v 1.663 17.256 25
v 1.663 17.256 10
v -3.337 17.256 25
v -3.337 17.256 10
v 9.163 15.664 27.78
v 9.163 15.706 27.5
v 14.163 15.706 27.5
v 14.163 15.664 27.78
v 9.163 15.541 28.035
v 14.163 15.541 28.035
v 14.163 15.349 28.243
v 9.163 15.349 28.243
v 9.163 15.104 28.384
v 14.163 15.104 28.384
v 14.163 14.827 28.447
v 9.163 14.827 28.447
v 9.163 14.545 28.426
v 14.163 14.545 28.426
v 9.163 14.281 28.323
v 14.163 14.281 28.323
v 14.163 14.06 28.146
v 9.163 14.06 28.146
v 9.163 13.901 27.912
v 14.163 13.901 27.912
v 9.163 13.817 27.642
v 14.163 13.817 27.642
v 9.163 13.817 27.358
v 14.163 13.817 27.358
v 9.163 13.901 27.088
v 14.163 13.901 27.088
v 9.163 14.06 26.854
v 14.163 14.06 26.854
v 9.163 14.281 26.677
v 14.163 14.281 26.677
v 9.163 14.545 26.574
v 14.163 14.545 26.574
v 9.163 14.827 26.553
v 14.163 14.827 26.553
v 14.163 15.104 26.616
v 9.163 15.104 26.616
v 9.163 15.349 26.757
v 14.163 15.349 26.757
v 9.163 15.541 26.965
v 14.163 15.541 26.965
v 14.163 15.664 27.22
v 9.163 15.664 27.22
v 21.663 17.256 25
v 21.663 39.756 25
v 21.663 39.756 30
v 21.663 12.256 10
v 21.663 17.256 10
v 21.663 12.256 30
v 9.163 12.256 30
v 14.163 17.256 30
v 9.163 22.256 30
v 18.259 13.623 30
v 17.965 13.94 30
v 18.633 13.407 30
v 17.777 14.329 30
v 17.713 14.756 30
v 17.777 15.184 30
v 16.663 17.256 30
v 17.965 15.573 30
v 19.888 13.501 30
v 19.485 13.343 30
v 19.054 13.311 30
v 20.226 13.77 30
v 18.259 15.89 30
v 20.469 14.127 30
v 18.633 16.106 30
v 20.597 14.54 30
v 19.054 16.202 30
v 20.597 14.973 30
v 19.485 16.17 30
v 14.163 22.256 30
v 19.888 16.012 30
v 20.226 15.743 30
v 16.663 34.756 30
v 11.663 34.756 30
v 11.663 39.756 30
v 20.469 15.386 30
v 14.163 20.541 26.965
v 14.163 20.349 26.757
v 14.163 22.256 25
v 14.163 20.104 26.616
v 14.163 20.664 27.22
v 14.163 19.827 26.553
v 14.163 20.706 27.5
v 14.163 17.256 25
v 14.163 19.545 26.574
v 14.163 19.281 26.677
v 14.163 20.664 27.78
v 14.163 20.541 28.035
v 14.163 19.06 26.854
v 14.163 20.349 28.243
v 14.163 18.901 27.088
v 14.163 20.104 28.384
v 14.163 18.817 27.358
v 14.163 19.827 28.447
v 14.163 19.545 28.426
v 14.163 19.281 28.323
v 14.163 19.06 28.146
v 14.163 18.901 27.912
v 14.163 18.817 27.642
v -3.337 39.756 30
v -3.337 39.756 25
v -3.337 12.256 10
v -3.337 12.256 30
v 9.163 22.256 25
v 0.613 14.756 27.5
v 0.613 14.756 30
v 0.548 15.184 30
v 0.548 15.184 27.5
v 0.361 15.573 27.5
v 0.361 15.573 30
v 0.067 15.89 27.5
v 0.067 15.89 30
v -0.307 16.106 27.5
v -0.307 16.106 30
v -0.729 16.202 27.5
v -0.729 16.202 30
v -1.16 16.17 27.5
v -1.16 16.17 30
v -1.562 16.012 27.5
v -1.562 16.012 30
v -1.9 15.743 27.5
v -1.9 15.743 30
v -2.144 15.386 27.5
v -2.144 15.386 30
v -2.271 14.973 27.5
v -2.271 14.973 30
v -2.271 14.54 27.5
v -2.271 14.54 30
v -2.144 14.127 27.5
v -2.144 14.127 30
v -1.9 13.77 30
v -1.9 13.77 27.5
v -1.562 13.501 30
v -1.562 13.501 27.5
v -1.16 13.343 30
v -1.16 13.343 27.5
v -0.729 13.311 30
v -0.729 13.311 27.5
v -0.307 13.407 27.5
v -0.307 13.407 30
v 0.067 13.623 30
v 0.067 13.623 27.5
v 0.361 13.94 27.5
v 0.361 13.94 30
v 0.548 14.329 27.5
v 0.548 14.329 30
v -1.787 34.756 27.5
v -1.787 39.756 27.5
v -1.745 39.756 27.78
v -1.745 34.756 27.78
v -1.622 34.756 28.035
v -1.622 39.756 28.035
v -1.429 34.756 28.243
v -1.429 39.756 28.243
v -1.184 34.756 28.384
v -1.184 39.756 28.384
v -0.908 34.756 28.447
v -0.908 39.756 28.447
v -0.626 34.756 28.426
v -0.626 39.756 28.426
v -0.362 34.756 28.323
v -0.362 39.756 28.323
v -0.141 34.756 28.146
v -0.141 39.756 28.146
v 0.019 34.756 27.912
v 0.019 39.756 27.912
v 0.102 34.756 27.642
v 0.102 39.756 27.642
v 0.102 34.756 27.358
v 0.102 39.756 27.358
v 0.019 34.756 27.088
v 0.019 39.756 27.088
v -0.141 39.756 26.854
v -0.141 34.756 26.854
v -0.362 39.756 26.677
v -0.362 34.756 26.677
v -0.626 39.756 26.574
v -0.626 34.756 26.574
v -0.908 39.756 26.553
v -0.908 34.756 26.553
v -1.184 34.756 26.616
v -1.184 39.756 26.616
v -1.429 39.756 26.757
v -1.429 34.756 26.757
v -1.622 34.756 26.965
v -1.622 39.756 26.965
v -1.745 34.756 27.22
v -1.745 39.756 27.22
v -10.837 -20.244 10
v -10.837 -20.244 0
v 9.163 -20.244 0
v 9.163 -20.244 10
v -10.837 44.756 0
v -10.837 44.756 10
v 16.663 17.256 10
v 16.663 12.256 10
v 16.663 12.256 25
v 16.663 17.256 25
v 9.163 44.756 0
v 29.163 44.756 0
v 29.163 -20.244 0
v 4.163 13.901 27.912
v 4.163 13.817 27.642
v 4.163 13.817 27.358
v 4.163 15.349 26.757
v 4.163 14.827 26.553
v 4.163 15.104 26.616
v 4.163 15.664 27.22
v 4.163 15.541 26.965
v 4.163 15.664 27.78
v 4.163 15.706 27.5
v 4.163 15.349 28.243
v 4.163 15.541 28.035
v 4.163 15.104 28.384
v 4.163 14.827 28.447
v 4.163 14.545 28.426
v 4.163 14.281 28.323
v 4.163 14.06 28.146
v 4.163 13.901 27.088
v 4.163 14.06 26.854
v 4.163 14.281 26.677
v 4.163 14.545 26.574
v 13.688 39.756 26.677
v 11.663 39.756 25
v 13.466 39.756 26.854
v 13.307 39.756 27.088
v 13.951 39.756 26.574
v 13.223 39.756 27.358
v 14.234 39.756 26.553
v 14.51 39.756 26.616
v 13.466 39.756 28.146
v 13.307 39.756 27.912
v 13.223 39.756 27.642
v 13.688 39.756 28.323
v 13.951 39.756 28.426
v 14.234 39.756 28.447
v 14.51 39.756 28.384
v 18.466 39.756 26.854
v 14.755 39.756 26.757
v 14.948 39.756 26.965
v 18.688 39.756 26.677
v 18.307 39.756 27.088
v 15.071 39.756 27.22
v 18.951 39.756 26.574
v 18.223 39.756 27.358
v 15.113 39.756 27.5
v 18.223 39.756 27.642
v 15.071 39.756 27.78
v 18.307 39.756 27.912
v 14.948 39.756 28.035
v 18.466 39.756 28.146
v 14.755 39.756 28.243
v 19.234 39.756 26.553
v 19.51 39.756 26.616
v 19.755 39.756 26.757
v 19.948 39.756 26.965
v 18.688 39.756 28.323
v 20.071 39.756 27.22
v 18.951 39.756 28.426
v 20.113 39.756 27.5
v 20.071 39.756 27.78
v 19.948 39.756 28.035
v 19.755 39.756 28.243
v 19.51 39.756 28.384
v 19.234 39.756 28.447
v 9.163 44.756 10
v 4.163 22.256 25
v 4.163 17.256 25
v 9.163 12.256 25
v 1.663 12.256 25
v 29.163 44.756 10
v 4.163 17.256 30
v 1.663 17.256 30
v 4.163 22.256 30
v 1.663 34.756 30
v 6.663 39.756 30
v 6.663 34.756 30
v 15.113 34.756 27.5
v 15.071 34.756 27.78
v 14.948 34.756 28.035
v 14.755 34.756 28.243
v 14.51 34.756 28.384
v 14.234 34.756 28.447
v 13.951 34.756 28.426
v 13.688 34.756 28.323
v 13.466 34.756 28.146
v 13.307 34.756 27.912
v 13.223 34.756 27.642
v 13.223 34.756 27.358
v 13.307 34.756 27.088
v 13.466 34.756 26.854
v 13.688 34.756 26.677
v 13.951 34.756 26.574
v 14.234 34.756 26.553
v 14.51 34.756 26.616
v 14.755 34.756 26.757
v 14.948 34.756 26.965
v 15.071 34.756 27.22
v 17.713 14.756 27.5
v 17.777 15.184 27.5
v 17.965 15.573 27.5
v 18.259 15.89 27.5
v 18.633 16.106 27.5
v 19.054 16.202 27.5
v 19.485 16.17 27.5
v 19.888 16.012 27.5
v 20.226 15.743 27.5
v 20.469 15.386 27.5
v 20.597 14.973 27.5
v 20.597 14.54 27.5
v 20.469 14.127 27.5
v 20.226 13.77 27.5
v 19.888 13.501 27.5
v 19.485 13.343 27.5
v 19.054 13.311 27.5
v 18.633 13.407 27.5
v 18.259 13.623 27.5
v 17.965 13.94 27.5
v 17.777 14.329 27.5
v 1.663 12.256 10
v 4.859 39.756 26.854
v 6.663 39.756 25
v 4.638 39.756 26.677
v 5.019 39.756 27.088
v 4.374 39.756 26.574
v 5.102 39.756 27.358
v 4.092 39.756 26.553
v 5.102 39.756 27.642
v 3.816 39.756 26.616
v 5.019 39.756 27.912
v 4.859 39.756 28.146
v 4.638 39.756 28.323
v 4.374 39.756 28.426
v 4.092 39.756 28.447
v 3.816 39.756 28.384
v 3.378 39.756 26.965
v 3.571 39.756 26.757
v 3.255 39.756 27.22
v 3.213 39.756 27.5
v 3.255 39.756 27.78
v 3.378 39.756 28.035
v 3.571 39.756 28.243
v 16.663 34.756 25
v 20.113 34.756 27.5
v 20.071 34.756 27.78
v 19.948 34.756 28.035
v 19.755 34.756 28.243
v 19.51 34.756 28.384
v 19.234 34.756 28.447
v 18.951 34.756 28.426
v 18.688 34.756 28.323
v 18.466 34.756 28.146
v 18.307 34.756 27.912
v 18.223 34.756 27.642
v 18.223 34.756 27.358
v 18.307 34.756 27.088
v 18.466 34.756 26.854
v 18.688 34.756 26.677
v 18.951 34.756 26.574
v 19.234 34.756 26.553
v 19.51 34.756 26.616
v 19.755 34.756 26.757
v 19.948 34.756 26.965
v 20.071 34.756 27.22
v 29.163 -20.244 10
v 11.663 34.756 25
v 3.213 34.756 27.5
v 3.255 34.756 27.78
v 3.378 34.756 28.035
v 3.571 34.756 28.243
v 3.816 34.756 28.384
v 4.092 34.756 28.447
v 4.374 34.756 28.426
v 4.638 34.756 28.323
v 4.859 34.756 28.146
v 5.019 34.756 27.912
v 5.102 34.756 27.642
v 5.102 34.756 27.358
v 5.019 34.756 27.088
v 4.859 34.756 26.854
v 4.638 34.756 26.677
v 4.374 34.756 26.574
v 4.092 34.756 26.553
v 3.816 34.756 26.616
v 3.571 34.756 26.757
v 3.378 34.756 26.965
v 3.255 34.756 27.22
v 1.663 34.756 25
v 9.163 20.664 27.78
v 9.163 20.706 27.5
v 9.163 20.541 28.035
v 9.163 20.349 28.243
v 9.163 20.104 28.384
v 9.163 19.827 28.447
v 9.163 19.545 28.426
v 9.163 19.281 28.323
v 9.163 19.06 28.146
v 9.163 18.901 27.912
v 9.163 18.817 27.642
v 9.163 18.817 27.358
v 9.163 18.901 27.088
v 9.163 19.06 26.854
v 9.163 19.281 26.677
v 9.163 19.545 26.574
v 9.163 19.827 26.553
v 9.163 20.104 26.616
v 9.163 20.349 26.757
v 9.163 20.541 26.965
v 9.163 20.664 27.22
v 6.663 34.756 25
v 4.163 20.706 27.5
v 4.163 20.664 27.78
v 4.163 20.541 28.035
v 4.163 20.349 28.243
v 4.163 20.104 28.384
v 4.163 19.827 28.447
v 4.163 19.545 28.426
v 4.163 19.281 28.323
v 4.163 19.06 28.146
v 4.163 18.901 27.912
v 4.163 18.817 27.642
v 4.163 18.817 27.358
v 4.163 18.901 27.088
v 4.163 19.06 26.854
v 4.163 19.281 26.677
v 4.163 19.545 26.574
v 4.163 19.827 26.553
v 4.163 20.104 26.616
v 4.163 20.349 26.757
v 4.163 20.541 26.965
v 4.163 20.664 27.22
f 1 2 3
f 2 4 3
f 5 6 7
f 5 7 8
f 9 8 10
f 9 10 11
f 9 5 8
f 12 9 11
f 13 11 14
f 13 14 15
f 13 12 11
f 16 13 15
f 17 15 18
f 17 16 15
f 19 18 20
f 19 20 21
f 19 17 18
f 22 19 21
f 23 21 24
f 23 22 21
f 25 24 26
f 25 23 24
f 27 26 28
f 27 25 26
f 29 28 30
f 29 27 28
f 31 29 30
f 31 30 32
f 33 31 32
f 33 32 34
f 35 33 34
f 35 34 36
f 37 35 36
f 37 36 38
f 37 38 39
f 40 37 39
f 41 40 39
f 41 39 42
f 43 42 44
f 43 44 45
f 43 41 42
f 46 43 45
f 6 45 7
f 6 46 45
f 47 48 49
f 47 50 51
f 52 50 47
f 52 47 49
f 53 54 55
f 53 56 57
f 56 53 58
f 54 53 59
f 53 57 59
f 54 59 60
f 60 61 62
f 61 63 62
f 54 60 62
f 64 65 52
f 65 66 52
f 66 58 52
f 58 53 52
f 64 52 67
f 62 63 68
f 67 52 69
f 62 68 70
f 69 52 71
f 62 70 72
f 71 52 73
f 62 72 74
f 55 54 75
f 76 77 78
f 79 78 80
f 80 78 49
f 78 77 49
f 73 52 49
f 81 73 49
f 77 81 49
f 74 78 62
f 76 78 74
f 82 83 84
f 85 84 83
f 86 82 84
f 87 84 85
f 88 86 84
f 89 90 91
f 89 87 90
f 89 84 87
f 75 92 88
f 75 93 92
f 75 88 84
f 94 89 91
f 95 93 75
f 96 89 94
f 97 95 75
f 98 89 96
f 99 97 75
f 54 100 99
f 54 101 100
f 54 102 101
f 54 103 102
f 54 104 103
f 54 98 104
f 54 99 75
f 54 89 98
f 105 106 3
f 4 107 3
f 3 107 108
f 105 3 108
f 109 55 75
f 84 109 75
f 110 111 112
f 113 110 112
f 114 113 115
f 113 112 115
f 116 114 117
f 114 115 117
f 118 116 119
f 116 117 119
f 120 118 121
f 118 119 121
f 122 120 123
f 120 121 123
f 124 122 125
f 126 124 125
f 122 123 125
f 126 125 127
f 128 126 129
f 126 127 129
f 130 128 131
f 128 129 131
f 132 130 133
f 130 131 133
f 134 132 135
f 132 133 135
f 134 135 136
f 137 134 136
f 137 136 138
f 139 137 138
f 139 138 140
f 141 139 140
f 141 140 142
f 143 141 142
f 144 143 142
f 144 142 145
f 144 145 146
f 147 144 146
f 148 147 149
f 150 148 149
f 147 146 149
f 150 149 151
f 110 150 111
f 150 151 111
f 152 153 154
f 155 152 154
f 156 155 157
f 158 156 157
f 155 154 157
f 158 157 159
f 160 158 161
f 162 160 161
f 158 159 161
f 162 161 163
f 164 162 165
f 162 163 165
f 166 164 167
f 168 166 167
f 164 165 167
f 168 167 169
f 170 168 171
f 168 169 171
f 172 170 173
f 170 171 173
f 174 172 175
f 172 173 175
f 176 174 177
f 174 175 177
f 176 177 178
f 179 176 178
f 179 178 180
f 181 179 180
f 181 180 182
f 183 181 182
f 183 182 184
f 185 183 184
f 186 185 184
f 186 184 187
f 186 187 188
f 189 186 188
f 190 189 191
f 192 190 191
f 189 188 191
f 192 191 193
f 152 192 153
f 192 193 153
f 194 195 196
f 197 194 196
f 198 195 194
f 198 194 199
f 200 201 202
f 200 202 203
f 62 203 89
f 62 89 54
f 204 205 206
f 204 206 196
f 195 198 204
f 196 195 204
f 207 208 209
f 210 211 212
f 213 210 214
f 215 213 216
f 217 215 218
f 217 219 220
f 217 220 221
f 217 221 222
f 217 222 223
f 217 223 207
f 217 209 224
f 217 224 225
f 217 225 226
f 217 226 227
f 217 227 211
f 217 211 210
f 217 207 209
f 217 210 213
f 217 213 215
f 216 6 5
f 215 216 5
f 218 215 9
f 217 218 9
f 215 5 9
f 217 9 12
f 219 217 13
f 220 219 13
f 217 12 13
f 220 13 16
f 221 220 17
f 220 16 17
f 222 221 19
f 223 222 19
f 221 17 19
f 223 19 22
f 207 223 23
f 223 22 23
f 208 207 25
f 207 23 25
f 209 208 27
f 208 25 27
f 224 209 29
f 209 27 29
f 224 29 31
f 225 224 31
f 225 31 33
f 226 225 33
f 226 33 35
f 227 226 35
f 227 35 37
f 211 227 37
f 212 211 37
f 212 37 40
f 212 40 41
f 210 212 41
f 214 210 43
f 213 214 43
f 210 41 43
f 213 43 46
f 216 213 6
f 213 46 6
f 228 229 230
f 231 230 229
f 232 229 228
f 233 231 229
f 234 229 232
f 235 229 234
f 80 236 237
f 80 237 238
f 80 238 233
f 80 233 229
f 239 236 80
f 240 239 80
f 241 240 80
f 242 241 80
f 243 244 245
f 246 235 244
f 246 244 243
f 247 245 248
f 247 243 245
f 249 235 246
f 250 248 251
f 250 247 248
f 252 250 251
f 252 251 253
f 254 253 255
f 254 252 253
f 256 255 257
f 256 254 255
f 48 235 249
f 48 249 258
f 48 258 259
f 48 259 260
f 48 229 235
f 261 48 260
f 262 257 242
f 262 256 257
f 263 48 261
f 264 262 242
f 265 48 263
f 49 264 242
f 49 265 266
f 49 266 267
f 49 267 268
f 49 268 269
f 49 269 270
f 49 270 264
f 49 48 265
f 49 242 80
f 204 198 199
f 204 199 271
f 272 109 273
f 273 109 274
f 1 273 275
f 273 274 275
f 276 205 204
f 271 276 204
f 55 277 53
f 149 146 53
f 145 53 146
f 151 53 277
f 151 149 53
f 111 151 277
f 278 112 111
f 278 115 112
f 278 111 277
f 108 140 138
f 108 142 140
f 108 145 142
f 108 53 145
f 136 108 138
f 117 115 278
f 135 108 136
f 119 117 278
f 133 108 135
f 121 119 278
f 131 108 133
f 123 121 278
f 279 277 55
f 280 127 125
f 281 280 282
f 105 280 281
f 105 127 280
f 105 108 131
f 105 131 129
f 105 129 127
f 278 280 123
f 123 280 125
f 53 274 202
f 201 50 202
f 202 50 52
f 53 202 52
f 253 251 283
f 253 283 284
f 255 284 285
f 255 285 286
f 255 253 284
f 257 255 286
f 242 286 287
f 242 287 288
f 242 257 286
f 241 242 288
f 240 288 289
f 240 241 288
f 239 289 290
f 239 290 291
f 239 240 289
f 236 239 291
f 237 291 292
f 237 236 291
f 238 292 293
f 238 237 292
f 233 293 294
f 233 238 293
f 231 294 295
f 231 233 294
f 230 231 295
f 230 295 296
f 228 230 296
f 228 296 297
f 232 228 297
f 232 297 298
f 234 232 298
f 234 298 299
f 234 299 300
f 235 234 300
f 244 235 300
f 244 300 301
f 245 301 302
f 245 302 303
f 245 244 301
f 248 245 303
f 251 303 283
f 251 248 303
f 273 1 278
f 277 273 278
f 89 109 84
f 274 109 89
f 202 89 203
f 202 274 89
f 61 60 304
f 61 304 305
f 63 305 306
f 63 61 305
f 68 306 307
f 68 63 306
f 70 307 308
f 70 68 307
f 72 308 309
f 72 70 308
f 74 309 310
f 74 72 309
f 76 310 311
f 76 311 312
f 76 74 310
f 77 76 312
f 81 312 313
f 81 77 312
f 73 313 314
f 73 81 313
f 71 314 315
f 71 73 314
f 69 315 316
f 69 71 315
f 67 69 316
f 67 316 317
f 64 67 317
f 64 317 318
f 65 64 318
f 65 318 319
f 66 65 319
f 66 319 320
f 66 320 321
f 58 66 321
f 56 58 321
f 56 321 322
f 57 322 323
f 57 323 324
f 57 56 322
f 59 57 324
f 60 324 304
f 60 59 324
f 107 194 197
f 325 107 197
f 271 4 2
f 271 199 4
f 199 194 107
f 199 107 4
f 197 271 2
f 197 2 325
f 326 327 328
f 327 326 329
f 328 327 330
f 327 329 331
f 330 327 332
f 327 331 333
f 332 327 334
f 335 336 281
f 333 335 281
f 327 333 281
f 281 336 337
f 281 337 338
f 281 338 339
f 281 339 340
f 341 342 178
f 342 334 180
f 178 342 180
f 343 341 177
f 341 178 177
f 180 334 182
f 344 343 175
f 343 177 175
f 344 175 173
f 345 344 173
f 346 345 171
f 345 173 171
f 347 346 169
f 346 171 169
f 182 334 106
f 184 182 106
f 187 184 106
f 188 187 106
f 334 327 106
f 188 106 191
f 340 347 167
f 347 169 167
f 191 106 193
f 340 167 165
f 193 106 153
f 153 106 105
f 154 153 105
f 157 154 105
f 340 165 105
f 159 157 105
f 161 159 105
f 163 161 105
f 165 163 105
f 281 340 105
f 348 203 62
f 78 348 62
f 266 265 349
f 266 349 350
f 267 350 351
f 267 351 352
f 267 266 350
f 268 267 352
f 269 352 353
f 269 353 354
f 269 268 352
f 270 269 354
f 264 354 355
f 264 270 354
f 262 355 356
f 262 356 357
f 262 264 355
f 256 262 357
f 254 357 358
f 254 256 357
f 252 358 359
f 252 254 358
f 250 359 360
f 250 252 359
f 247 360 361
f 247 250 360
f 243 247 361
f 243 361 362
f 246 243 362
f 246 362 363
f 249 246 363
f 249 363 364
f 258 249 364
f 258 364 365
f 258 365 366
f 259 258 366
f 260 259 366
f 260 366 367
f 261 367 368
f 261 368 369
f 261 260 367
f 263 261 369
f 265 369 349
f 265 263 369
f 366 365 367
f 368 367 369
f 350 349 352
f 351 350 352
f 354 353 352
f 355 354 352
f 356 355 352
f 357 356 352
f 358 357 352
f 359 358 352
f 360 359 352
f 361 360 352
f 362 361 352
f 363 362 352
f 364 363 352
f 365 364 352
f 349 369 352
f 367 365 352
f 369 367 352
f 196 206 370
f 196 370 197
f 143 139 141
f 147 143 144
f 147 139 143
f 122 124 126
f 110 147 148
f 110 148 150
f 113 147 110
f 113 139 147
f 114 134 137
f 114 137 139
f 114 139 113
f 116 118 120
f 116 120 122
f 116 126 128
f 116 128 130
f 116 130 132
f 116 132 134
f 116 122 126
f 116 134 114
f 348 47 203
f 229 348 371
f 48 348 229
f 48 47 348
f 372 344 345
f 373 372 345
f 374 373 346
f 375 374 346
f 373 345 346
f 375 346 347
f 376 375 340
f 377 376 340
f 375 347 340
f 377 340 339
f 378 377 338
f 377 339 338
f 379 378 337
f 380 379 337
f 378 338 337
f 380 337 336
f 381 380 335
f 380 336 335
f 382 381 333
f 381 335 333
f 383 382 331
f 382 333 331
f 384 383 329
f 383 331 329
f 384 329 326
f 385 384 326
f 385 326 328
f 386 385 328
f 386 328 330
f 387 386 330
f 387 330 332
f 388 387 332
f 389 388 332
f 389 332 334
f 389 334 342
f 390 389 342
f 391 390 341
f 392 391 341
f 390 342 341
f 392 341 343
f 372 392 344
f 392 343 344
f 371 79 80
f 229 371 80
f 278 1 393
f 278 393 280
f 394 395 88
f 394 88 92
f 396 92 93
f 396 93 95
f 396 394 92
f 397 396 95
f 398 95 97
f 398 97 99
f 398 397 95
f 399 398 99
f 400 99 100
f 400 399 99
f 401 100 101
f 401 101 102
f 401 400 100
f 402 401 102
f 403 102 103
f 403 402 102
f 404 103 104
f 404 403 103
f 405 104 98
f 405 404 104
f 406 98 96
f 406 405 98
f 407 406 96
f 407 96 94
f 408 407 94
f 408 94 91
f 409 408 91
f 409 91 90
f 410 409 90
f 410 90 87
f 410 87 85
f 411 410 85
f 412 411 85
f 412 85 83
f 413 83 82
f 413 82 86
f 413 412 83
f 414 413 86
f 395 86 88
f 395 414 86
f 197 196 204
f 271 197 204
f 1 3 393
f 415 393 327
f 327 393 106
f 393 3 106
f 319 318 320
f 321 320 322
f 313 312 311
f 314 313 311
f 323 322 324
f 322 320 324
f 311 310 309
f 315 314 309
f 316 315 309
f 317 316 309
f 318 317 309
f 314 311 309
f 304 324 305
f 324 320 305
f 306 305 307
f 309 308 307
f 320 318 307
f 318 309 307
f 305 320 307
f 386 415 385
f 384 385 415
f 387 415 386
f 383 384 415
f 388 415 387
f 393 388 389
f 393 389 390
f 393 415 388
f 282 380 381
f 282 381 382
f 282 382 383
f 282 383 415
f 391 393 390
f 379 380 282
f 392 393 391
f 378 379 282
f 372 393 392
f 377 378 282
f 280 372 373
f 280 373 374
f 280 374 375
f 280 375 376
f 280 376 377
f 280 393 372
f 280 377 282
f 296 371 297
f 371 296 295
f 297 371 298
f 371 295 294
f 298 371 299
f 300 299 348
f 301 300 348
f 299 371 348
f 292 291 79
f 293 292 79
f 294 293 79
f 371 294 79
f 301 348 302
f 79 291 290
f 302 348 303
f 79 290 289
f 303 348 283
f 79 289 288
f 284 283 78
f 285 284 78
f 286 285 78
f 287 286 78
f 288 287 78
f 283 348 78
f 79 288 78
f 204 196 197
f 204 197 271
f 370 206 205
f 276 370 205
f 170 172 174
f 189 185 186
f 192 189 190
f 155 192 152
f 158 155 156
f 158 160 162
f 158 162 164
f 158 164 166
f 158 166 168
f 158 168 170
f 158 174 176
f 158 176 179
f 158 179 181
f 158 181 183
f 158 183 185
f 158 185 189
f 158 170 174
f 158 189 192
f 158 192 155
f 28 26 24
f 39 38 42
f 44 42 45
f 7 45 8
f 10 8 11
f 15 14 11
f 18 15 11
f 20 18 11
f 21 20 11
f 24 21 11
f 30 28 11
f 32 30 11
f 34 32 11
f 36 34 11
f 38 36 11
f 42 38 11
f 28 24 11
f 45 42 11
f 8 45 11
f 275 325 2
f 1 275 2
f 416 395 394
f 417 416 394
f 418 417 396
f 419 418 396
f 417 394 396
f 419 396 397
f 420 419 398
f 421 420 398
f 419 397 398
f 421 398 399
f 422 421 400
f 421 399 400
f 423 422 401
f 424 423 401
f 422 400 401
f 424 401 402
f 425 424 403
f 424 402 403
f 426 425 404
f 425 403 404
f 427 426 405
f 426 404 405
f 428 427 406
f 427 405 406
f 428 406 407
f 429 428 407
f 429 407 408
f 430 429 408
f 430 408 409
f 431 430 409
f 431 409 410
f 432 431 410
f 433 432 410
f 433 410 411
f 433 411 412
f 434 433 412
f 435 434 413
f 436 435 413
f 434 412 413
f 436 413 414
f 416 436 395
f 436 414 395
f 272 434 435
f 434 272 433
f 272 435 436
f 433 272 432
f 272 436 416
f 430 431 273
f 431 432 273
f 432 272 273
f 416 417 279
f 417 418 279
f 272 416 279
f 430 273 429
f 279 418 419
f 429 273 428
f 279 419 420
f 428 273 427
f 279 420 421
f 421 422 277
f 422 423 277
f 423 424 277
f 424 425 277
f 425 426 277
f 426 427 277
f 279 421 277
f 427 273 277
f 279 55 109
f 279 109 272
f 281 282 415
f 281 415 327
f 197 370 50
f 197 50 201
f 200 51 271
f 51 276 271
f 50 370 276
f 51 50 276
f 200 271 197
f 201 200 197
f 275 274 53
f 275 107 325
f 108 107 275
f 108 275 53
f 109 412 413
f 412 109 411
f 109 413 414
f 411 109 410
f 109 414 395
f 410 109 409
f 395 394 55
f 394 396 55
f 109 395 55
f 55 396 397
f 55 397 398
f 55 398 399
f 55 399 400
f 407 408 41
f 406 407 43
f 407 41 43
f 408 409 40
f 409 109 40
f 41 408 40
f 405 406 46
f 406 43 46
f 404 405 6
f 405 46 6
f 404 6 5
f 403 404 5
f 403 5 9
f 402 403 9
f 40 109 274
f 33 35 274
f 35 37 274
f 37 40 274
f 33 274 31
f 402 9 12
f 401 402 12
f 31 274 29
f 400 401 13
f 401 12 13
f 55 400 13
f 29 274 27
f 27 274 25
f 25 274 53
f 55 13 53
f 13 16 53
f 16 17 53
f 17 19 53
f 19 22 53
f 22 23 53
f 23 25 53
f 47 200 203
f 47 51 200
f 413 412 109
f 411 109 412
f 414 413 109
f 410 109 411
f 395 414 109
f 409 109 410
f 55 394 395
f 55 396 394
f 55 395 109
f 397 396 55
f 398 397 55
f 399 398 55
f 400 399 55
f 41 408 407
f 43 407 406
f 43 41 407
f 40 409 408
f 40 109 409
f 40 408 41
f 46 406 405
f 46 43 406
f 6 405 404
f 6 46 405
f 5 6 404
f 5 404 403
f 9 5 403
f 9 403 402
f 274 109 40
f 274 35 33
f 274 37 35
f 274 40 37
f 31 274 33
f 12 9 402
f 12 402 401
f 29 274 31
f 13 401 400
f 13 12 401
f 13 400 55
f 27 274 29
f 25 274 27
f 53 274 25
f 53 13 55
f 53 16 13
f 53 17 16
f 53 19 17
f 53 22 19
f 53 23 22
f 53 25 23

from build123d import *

# Parameters (mm, degrees)
F0_W      = 20
F0_H      = 65
F0_W_2    = 5
F0_H_2    = 5
F1_DEPTH  = 10
F2_DEPTH  = 30
F3_W      = 5
F3_H      = 5
F4_DEPTH  = 7.5
F5_W      = 5
F5_H      = 5
F6_DEPTH  = 22.5
F7_R      = 1.45
F8_DEPTH  = 2.5
F9_R      = 0.95
F10_DEPTH = 5
F11_R     = 0.95
F12_DEPTH = 5
F13_W     = 5
F13_H     = 5
F14_DEPTH = 5
F15_W     = 5
F15_H     = 5
F16_DEPTH = 5
F18_R     = 0.95
F19_DEPTH = 5
F20_R     = 0.95
F21_DEPTH = 5


with BuildPart() as f1:
    # F0 (on Top) → F1 (new body)
    with BuildSketch(Plane.XY):
        with Locations((-0.8371751755, 12.2564576566)):
            Rectangle(F0_W, F0_H)
        with Locations((-0.8371751755, 14.7564576566)):
            Rectangle(F0_W_2, F0_H_2, mode=Mode.SUBTRACT)
    extrude(amount=F1_DEPTH)

    # F0 (on Top) → F2 (join)
    with BuildSketch(Plane.XY):
        with Locations((-0.8371751755, 14.7564576566)):
            Rectangle(F0_W_2, F0_H_2)
    extrude(amount=F2_DEPTH)

    # F3 (on face) → F4 (join)
    with BuildSketch(Plane.YZ.offset(1.6628248245)):
        with Locations((14.7564576566, 27.5)):
            Rectangle(F3_W, F3_H)
    extrude(amount=F4_DEPTH)

    # F5 (on face) → F6 (join)
    with BuildSketch(Plane(origin=(0, 17.2564576566, 0), x_dir=(-1, 0, 0), z_dir=(0, 1, 0))):
        with Locations((0.8371751755, 27.5)):
            Rectangle(F5_W, F5_H)
    extrude(amount=F6_DEPTH)

    # F7 (on face) → F8 (cut)
    with BuildSketch(Plane.XY.offset(30)):
        with Locations((-0.8371751755, 14.7564576566)):
            Circle(F7_R)
    extrude(amount=-F8_DEPTH, mode=Mode.SUBTRACT)

    # F9 (on face) → F10 (cut)
    with BuildSketch(Plane(origin=(0, 39.7564576566, 0), x_dir=(-1, 0, 0), z_dir=(0, 1, 0))):
        with Locations((0.8371751755, 27.5)):
            Circle(F9_R)
    extrude(amount=-F10_DEPTH, mode=Mode.SUBTRACT)

    # F11 (on face) → F12 (cut)
    with BuildSketch(Plane.YZ.offset(9.1628248245)):
        with Locations((14.7564576566, 27.5)):
            Circle(F11_R)
    extrude(amount=-F12_DEPTH, mode=Mode.SUBTRACT)

    # F13 (on face) → F14 (join)
    with BuildSketch(Plane(origin=(0, 17.2564576566, 0), x_dir=(-1, 0, 0), z_dir=(0, 1, 0))):
        with Locations((-6.6628248245, 27.5)):
            Rectangle(F13_W, F13_H)
    extrude(amount=F14_DEPTH)

    # F15 (on face) → F16 (join)
    with BuildSketch(Plane.YZ.offset(1.6628248245)):
        with Locations((37.2564576566, 27.5)):
            Rectangle(F15_W, F15_H)
    extrude(amount=F16_DEPTH)

    # F17: union 

    # F18 (on face) → F19 (cut)
    with BuildSketch(Plane(origin=(0, 39.7564576566, 0), x_dir=(-1, 0, 0), z_dir=(0, 1, 0))):
        with Locations((-4.1628248245, 27.5)):
            Circle(F18_R)
    extrude(amount=-F19_DEPTH, mode=Mode.SUBTRACT)

    # F20 (on face) → F21 (cut)
    with BuildSketch(Plane.YZ.offset(9.1628248245)):
        with Locations((19.7564576566, 27.5)):
            Circle(F20_R)
    extrude(amount=-F21_DEPTH, mode=Mode.SUBTRACT)


with BuildPart() as f22_1:
    # F22: instance of F1
    add(f1.part.mirror(Plane(origin=(9.1628248245, 12.2564576566, 5), x_dir=(0, 1, 0), z_dir=(1, 0, 0))))


solid = Compound([f1.part, f22_1.part])
